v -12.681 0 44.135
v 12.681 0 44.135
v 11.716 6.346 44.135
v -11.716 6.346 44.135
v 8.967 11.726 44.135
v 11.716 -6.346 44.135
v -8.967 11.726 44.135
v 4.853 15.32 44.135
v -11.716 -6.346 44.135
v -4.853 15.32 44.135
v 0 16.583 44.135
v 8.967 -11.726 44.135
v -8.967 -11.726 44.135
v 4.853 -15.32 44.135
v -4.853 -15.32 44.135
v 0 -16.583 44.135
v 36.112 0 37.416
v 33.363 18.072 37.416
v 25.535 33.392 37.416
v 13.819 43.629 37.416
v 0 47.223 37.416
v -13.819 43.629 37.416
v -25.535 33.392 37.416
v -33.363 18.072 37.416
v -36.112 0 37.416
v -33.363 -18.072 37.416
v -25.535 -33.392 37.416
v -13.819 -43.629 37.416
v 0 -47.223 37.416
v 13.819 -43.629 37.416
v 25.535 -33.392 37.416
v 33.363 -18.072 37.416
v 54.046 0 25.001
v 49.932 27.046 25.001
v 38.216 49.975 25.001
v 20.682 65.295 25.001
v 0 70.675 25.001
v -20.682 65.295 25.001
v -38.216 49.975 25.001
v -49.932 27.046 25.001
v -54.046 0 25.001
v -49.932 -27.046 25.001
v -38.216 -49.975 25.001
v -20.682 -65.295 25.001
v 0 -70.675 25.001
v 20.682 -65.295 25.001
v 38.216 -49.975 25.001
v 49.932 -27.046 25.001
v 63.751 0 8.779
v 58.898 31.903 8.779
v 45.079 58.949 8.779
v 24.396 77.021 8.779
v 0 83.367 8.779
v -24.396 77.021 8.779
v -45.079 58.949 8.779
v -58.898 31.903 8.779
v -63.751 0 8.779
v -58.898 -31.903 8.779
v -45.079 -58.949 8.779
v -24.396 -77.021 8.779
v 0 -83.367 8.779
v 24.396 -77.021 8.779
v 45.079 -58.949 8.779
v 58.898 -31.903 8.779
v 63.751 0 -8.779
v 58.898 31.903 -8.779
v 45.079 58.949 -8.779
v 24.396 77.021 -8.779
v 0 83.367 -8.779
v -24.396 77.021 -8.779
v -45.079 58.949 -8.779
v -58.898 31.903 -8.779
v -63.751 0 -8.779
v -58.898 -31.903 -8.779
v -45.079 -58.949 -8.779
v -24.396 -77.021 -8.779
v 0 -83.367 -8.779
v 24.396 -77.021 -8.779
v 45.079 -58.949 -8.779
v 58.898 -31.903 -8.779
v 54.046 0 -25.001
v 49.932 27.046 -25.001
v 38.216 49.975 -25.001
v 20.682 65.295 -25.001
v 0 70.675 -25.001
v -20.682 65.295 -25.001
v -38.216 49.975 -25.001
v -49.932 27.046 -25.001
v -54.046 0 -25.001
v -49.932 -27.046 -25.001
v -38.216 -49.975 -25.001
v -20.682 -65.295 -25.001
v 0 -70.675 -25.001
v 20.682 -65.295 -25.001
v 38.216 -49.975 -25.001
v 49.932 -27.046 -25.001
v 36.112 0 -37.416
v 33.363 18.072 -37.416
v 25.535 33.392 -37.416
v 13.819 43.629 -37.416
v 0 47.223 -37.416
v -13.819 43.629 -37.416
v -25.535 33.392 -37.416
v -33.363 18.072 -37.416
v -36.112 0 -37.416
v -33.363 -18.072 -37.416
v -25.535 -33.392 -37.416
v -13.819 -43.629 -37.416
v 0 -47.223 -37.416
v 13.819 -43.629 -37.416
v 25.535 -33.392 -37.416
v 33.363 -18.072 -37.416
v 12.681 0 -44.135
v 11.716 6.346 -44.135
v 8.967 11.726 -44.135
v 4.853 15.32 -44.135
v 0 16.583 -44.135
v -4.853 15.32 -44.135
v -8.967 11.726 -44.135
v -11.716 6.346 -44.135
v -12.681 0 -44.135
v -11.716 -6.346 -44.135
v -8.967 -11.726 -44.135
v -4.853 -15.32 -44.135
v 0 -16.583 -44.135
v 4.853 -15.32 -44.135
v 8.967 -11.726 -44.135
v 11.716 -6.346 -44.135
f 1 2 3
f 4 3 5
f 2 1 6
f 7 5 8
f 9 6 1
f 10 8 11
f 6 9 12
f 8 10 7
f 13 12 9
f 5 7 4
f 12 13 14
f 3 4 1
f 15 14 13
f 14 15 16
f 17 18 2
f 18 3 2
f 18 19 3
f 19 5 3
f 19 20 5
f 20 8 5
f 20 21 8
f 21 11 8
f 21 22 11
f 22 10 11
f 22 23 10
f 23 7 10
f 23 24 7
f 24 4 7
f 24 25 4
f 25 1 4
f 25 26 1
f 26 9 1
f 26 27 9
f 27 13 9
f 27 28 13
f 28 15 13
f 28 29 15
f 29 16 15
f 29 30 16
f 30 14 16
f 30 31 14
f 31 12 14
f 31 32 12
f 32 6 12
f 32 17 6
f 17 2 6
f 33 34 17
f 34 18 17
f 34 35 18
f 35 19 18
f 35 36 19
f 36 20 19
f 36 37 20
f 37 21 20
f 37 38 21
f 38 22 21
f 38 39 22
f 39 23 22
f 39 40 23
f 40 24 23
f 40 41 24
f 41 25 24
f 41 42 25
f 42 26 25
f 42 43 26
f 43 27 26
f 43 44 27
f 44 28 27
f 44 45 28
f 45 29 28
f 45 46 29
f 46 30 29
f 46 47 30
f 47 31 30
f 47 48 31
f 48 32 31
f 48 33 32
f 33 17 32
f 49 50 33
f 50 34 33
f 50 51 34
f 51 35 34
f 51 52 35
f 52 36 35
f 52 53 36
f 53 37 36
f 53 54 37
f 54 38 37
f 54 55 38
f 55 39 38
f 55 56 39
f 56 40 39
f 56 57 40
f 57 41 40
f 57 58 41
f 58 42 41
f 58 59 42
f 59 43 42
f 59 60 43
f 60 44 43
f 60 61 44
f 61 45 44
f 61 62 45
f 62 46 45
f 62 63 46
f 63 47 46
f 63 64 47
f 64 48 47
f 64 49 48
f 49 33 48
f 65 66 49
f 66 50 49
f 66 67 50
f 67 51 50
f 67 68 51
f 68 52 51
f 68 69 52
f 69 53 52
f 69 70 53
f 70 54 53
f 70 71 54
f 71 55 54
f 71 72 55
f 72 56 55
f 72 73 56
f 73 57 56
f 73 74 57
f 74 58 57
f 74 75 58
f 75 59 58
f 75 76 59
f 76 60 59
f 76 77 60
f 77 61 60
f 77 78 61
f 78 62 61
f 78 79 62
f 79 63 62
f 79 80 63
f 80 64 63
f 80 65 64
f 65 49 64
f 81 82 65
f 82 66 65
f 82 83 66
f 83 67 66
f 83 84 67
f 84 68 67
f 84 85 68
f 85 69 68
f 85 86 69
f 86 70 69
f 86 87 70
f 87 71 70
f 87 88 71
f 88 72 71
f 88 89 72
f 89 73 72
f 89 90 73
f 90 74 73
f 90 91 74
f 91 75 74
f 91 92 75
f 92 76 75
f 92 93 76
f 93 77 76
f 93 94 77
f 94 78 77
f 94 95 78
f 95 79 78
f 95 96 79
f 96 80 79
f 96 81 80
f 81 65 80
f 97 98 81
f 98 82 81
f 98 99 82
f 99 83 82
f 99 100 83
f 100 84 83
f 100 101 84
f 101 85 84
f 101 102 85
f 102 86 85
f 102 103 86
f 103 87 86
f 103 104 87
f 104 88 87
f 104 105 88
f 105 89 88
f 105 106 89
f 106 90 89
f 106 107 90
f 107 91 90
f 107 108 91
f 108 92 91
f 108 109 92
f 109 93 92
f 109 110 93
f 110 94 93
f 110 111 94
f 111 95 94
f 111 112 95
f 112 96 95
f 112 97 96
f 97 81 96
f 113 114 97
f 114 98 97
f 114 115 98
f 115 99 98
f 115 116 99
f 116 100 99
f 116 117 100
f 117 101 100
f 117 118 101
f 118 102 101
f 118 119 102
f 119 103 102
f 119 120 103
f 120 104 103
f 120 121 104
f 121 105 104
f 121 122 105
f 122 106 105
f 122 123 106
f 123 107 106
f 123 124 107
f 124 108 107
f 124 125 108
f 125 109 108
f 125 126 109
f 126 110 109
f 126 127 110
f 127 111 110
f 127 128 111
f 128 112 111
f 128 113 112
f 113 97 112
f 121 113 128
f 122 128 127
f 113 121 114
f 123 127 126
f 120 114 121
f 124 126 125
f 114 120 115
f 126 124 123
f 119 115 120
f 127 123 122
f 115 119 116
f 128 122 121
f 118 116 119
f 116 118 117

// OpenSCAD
// Generated by SolidPython 1.0.1 on 2020-07-29 00:46:51


scale(v = [13, 17, 9]) {
	sphere(r = 5);
}
/***********************************************
*********      SolidPython code:      **********
************************************************
 
# import packages: SolidPython
from solid import *
from solid.utils import *
from itertools import chain, combinations, permutations


class Resize:

    def __init__(self, scad_file):
        self.scad_file = scad_file
        #self.scad_file = import_scad(scad_file)
        # cone/cylinder param:
        self.r1 = 0
        self.r2 = 0
        self.h = 0
        # rectangular prism param:
        self.w = 0
        self.l = 0
        # ellipse param:
        self.r = 0

    # import OpenScad code (file name corresponds to shape)


    # classify shape + parameters
    def assign(self, param1, param2, param3):
        if self.scad_file == 'cone.scad':
            self.r1 = param1
            self.r2 = param2
            self.h = param3
        elif self.scad_file == 'cylinder.scad':
            self.r1 = param1
            self.r2 = param2
            self.h = param3
        elif self.scad_file == 'rectangularPrism.scad':
            self.h = param1
            self.l = param2
            self.w = param3
        else:
            self.r = param1
            self.h = param2

    # resize parameters
    def iterate(self):
        x = range(3, 20, 2)
        i = 1
        if self.scad_file == 'cone.scad':
            tempList = list(permutations(x, 2))
            for temp in tempList:
                param1 = temp[0]
                param2 = temp[1]
                filepath = 'produced_scad_files/' + 'cone' + str(param1) + '_' + str(param2) + '_' + '.scad'
                scad_render_to_file(cylinder(h=param1, r1=param2, r2=0), filepath)

        elif self.scad_file == 'cylinder.scad':
            tempList = list(permutations(x, 3))
            for temp in tempList:
                param1 = temp[0]
                param2 = temp[1]
                filepath = 'produced_scad_files/' + 'cylinder' + str(param1) + '_' + str(param2) + '_' + '.scad'
                scad_render_to_file(cylinder(h=param1, r1=param2, r2=param2), filepath)

        elif self.scad_file == 'rectangularPrism.scad':
            tempList = list(permutations(x, 3))
            for temp in tempList:
                param1 = temp[0]
                param2 = temp[1]
                param3 = temp[2]
                filepath = 'produced_scad_files/' + 'rectangularPrism' + str(param1) + '_' + str(param2) + '_' + str(
                    param3) + '.scad'
                scad_render_to_file(cube(size=(param1, param2, param3)), filepath)

        elif self.scad_file == 'ellipse.scad':
            tempList = list(permutations(x, 4))
            for temp in tempList:
                param1 = temp[0]
                param2 = temp[1]
                param3 = temp[2]
                param4 = temp[3]
                filepath = 'produced_scad_files/' + 'ellipse' + str(param1) + '_' + str(param2) + '_' + str(param3) + '_' + str(param4) + '.scad'
                scad_render_to_file(scale([param1, param2, param3])(sphere(r=param4)), filepath)

    def render_to_scadfile(self):
        scad_render_to_file(scad, 'example.scad') 
 
************************************************/
